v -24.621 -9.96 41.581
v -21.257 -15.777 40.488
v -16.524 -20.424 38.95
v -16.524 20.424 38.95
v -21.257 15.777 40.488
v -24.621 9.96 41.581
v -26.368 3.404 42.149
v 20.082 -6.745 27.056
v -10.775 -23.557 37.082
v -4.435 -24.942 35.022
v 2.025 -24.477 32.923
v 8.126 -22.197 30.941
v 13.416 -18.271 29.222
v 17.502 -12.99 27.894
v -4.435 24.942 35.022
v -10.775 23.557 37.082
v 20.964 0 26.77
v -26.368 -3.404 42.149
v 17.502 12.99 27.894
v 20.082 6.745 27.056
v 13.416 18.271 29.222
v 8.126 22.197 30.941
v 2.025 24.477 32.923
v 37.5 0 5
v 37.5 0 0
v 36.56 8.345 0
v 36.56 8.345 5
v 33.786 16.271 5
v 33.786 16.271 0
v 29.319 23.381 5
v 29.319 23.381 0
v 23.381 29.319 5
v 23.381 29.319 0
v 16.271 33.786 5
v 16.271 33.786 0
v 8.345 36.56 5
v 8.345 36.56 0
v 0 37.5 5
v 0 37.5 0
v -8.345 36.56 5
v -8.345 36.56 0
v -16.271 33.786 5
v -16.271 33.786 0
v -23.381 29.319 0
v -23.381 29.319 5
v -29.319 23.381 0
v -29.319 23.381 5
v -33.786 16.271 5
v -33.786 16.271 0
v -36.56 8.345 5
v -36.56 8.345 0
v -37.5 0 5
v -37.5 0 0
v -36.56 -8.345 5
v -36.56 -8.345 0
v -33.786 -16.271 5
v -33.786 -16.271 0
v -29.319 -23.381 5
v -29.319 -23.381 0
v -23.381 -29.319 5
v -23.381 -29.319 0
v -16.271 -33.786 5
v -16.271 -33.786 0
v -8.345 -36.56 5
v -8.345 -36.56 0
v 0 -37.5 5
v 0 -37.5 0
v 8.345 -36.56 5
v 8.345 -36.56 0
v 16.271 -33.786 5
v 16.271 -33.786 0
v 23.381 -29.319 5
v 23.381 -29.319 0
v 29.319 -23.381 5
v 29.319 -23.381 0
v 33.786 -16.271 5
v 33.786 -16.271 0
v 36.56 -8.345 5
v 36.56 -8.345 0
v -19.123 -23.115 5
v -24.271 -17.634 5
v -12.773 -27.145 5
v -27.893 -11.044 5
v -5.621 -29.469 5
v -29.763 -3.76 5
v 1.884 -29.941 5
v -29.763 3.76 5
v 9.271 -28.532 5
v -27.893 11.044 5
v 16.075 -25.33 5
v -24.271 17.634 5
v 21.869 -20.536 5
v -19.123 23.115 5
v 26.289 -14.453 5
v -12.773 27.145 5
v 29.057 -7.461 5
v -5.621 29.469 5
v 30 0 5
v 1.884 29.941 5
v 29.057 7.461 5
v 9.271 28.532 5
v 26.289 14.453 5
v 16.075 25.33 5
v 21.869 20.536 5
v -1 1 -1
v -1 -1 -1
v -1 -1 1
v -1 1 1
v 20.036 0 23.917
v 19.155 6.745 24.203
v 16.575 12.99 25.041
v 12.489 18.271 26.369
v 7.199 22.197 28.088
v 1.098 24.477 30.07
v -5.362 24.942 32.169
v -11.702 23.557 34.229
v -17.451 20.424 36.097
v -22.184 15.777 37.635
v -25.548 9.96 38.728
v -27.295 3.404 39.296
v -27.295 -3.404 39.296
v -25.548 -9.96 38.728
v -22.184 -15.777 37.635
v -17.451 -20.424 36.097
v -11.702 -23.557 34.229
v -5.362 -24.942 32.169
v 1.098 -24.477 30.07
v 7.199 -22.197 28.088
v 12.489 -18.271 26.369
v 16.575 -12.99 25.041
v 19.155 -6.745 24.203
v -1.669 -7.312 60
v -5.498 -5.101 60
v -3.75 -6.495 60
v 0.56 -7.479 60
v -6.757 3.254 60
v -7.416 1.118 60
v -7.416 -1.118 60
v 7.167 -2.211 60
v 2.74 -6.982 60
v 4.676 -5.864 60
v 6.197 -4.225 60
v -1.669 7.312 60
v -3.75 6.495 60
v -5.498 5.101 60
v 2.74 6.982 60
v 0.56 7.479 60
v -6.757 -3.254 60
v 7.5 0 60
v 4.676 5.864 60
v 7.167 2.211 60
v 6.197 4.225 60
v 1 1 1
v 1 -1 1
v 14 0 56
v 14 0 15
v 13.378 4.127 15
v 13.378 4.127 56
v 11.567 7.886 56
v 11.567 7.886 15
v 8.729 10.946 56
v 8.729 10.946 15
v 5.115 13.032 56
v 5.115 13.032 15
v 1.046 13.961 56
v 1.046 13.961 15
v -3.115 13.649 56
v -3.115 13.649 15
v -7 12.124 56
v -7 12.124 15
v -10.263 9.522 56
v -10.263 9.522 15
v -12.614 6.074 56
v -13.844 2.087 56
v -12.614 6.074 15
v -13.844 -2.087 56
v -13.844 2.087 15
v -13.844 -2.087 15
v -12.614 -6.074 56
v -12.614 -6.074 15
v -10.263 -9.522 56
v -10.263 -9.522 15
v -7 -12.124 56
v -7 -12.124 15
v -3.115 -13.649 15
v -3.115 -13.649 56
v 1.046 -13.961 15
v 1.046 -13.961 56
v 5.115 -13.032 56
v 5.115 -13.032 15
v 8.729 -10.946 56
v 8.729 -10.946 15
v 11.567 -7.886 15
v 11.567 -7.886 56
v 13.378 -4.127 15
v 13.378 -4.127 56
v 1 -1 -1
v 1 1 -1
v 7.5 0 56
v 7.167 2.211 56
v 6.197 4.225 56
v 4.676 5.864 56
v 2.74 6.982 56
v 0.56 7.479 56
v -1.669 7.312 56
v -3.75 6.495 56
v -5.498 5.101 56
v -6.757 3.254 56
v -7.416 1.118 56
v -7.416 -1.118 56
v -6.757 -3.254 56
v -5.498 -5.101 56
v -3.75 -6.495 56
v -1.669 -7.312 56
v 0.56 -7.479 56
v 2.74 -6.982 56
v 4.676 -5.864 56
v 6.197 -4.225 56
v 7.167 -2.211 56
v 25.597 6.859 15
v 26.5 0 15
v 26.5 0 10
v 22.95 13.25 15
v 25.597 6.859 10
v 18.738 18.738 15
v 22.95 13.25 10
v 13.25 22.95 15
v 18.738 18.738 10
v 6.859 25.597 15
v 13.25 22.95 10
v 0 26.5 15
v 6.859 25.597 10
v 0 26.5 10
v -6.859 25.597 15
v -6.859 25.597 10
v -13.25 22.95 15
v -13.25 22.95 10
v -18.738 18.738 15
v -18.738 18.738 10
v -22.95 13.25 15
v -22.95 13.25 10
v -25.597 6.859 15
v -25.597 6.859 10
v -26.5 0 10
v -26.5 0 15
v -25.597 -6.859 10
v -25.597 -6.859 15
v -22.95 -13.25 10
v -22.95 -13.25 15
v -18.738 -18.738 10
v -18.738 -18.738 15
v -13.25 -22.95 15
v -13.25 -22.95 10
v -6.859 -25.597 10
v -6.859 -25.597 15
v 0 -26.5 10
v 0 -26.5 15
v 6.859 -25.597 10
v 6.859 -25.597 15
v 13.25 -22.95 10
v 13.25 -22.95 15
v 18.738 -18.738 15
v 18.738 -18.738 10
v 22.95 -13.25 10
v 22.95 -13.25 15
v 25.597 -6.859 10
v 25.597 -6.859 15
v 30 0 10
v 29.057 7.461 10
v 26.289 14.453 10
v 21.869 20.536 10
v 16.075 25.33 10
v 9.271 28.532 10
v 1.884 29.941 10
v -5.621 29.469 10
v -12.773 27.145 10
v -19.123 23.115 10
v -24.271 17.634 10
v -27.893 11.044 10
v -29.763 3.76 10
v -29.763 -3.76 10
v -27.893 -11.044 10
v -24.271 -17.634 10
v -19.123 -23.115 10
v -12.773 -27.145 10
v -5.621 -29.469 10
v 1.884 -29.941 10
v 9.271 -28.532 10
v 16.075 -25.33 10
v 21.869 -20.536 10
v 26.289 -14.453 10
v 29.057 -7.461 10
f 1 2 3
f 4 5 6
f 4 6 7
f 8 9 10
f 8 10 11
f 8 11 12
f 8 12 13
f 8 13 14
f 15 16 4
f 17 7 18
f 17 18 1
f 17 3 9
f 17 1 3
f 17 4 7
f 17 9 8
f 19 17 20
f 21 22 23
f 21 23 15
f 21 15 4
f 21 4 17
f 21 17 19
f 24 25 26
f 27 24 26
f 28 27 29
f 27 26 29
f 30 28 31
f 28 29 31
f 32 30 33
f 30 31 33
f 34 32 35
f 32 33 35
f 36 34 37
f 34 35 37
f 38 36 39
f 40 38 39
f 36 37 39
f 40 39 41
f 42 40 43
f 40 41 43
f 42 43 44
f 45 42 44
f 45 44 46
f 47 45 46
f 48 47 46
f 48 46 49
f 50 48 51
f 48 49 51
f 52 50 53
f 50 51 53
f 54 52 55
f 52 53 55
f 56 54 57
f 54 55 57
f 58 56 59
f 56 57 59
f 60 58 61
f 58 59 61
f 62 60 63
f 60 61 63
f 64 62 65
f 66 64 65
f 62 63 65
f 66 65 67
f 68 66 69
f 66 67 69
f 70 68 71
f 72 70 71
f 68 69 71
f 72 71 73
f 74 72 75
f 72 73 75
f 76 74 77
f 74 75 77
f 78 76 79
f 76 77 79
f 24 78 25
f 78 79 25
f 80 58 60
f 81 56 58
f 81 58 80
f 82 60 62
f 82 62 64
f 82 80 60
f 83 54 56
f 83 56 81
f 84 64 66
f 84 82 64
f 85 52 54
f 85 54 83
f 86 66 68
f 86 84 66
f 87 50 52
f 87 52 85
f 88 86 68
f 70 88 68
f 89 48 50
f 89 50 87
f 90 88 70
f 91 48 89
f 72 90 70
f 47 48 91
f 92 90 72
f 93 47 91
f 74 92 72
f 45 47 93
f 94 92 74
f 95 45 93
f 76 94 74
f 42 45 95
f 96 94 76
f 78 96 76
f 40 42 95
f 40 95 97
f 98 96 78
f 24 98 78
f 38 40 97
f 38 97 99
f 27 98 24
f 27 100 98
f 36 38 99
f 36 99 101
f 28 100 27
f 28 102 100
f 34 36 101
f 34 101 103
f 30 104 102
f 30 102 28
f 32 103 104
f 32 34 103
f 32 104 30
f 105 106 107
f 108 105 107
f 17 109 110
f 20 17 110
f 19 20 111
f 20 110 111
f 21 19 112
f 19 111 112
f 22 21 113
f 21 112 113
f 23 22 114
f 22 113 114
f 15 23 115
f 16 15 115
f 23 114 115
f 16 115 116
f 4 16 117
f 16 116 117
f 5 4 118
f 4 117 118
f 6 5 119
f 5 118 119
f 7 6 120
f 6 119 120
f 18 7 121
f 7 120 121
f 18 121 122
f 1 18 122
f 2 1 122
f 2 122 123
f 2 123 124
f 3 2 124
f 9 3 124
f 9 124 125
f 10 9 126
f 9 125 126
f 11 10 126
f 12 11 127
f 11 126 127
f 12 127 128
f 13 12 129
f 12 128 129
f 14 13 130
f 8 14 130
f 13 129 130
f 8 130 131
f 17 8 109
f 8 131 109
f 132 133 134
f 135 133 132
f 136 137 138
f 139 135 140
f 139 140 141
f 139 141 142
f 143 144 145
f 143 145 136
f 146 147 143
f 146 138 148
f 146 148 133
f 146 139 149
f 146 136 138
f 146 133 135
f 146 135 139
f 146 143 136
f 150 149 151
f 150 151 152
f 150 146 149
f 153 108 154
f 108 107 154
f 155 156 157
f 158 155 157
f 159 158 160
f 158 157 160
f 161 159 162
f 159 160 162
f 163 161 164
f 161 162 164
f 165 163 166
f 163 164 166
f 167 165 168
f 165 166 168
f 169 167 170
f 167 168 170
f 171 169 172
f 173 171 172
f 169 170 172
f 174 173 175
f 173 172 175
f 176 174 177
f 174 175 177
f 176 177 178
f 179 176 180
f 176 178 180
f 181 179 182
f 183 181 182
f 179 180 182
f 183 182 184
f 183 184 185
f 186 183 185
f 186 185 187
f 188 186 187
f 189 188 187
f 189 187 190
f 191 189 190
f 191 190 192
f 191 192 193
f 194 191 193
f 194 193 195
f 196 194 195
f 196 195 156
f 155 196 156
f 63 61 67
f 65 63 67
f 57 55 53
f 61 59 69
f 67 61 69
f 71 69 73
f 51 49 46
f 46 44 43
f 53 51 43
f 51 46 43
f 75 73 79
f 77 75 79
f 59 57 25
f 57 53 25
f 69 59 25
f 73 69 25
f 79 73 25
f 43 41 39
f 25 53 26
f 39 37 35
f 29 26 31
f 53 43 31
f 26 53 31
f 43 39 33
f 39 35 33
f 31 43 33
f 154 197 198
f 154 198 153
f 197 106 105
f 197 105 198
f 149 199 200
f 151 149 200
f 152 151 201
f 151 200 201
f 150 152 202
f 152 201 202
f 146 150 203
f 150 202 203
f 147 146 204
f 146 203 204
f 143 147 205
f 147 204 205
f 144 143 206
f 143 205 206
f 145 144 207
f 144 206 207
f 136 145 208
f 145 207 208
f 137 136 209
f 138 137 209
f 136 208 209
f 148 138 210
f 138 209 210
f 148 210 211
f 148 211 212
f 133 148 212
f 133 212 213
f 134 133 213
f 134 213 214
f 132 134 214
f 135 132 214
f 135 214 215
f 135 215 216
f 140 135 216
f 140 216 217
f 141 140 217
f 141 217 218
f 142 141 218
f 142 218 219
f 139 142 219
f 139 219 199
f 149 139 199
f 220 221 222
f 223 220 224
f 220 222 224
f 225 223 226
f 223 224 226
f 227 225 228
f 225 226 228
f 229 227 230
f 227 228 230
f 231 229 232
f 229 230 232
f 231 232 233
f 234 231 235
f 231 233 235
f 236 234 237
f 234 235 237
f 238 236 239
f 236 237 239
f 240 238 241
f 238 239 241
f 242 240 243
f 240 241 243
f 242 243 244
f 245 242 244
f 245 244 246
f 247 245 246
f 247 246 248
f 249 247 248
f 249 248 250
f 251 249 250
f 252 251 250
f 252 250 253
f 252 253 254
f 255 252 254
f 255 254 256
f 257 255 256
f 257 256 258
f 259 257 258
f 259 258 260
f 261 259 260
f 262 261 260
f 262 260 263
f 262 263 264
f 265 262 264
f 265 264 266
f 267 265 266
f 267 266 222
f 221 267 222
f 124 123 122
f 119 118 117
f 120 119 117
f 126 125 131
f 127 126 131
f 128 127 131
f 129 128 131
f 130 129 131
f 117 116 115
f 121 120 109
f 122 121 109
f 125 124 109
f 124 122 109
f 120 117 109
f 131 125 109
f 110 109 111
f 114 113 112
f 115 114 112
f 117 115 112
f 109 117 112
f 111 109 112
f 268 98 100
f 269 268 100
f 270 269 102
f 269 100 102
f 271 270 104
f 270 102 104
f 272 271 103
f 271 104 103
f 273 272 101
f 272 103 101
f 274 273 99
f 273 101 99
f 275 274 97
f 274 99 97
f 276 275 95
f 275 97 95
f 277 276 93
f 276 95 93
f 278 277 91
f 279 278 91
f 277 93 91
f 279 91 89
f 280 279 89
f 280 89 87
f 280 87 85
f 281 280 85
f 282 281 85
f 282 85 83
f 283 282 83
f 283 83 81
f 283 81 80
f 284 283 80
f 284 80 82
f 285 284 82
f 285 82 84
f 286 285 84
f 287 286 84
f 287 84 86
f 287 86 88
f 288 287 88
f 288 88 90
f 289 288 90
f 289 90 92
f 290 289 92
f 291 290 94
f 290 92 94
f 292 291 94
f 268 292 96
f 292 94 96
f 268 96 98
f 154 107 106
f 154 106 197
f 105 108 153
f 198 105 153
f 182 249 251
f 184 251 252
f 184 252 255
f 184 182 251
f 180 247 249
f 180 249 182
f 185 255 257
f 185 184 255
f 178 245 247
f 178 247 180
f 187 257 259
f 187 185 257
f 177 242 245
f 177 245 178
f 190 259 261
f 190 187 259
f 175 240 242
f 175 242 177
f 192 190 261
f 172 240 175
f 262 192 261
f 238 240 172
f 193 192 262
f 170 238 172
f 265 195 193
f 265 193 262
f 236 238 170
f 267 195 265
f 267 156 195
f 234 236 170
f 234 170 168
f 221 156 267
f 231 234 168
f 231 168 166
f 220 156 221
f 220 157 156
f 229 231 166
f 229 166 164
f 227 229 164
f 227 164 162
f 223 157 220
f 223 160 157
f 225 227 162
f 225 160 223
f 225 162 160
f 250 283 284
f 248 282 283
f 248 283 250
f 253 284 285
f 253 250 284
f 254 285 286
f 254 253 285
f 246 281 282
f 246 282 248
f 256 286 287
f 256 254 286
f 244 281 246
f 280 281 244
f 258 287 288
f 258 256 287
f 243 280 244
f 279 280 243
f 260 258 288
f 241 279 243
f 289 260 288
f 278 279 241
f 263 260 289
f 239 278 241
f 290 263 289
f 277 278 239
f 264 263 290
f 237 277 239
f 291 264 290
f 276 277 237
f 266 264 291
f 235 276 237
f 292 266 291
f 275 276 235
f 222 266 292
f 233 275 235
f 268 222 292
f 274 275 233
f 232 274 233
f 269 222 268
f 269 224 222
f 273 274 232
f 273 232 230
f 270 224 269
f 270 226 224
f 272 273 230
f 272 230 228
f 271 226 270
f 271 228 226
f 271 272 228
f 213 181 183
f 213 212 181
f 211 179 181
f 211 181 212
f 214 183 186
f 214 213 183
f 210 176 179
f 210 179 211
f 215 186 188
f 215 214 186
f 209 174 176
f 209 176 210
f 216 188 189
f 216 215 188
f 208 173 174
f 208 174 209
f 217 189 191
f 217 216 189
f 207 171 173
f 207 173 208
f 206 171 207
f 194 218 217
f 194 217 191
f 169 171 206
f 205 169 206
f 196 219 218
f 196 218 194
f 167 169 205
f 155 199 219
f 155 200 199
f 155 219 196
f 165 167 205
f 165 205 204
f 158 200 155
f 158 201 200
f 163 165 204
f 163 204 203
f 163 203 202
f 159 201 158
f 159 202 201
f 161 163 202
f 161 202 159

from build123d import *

# Parameters (mm, degrees)
F0_W      = 2
F0_H      = 2
F1_DEPTH  = 1
F2_R      = 7.5
F3_DEPTH  = 60
F4_R      = 14
F5_DEPTH  = 56
F6_R      = 37.5
F7_DEPTH  = 5
F8_R      = 30
F9_DEPTH  = 10
F10_R     = 26.5
F11_DEPTH = 15
F12_R     = 25
F13_DEPTH = 3
F14_ANGLE = 18


with BuildPart() as f1:
    # F0 (on Front) → F1 (new body, symmetric)
    with BuildSketch(Plane.XZ):
        Rectangle(F0_W, F0_H)
    extrude(amount=F1_DEPTH, both=True)


with BuildPart() as f3:
    # F2 (on Top) → F3 (new body)
    with BuildSketch(Plane.XY):
        Circle(F2_R)
    extrude(amount=F3_DEPTH)

    # F4 (on Top) → F5 (join)
    with BuildSketch(Plane.XY):
        Circle(F4_R)
    extrude(amount=F5_DEPTH)

    # F6 (on Top) → F7 (join)
    with BuildSketch(Plane.XY):
        Circle(F6_R)
    extrude(amount=F7_DEPTH)

    # F8 (on Top) → F9 (join)
    with BuildSketch(Plane.XY):
        Circle(F8_R)
    extrude(amount=F9_DEPTH)

    # F10 (on Top) → F11 (join)
    with BuildSketch(Plane.XY):
        Circle(F10_R)
    extrude(amount=F11_DEPTH)


with BuildPart() as f13:
    # F12 (on Top) → F13 (new body)
    with BuildSketch(Plane.XY):
        Circle(F12_R)
    extrude(amount=F13_DEPTH)


with BuildPart() as f13_1:
    # F14: moved
    add(f13.part.rotate(Axis((-1, 0, -1), (0, 1, 0)), F14_ANGLE))


with BuildPart() as f13_2:
    # F15: moved
    add(f13_1.part.moved(Location((-4, 0, 32))))


solid = Compound([f1.part, f3.part, f13_2.part])
